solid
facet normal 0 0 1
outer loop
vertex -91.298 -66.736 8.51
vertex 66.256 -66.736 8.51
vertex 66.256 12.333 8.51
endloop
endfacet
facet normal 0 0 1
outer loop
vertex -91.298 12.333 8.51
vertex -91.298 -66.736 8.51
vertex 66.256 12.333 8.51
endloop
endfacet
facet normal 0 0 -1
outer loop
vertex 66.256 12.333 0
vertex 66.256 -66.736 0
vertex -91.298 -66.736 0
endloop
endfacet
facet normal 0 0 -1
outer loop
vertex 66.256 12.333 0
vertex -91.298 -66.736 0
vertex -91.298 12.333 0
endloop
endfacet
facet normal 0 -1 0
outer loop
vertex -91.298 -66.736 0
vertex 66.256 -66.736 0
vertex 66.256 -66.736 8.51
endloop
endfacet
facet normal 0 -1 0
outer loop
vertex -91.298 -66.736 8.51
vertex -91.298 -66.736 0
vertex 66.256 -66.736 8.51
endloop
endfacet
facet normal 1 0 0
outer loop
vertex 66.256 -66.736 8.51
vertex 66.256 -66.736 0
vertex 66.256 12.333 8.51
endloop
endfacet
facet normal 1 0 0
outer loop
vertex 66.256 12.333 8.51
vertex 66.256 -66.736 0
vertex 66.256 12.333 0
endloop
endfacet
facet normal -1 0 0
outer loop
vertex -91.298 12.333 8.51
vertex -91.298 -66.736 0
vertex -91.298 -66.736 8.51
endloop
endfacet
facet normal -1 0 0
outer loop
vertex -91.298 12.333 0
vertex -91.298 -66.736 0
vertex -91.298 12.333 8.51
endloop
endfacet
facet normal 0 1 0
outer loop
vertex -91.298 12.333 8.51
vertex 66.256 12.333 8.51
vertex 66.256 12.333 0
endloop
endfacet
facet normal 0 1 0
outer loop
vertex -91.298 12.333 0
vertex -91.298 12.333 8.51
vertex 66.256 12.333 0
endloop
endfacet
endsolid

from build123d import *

# Parameters (mm, degrees)
F0_W     = 132.5789391994
F0_H     = 79.0697522461
F1_DEPTH = 8.5103549063
F2_W     = 132.5789391994
F2_H     = 79.0697522461
F3_DEPTH = 4.4518793002
F4_DEPTH = 157.5544029474


with BuildPart() as f1:
    # F0 (on Top) → F1 (new body)
    with BuildSketch(Plane.XY):
        with Locations((-0.0331550837, -27.2014793009)):
            Rectangle(F0_W, F0_H)
    extrude(amount=F1_DEPTH)

    # F2 (on face) → F3 (join)
    with BuildSketch(Plane.XY.offset(8.5103549063)):
        with Locations((-0.0331550837, -27.2014793009)):
            Rectangle(F2_W, F2_H)
    extrude(amount=-F3_DEPTH)

    # F4 (add): a face of the model
    f4_faces = [f1.faces().sort_by_distance(p)[0] for p in [
        (66.2563145161, -27.2014793009, 4.2551774532),
    ]]
    extrude(f4_faces, amount=-F4_DEPTH)


solid = f1.part
